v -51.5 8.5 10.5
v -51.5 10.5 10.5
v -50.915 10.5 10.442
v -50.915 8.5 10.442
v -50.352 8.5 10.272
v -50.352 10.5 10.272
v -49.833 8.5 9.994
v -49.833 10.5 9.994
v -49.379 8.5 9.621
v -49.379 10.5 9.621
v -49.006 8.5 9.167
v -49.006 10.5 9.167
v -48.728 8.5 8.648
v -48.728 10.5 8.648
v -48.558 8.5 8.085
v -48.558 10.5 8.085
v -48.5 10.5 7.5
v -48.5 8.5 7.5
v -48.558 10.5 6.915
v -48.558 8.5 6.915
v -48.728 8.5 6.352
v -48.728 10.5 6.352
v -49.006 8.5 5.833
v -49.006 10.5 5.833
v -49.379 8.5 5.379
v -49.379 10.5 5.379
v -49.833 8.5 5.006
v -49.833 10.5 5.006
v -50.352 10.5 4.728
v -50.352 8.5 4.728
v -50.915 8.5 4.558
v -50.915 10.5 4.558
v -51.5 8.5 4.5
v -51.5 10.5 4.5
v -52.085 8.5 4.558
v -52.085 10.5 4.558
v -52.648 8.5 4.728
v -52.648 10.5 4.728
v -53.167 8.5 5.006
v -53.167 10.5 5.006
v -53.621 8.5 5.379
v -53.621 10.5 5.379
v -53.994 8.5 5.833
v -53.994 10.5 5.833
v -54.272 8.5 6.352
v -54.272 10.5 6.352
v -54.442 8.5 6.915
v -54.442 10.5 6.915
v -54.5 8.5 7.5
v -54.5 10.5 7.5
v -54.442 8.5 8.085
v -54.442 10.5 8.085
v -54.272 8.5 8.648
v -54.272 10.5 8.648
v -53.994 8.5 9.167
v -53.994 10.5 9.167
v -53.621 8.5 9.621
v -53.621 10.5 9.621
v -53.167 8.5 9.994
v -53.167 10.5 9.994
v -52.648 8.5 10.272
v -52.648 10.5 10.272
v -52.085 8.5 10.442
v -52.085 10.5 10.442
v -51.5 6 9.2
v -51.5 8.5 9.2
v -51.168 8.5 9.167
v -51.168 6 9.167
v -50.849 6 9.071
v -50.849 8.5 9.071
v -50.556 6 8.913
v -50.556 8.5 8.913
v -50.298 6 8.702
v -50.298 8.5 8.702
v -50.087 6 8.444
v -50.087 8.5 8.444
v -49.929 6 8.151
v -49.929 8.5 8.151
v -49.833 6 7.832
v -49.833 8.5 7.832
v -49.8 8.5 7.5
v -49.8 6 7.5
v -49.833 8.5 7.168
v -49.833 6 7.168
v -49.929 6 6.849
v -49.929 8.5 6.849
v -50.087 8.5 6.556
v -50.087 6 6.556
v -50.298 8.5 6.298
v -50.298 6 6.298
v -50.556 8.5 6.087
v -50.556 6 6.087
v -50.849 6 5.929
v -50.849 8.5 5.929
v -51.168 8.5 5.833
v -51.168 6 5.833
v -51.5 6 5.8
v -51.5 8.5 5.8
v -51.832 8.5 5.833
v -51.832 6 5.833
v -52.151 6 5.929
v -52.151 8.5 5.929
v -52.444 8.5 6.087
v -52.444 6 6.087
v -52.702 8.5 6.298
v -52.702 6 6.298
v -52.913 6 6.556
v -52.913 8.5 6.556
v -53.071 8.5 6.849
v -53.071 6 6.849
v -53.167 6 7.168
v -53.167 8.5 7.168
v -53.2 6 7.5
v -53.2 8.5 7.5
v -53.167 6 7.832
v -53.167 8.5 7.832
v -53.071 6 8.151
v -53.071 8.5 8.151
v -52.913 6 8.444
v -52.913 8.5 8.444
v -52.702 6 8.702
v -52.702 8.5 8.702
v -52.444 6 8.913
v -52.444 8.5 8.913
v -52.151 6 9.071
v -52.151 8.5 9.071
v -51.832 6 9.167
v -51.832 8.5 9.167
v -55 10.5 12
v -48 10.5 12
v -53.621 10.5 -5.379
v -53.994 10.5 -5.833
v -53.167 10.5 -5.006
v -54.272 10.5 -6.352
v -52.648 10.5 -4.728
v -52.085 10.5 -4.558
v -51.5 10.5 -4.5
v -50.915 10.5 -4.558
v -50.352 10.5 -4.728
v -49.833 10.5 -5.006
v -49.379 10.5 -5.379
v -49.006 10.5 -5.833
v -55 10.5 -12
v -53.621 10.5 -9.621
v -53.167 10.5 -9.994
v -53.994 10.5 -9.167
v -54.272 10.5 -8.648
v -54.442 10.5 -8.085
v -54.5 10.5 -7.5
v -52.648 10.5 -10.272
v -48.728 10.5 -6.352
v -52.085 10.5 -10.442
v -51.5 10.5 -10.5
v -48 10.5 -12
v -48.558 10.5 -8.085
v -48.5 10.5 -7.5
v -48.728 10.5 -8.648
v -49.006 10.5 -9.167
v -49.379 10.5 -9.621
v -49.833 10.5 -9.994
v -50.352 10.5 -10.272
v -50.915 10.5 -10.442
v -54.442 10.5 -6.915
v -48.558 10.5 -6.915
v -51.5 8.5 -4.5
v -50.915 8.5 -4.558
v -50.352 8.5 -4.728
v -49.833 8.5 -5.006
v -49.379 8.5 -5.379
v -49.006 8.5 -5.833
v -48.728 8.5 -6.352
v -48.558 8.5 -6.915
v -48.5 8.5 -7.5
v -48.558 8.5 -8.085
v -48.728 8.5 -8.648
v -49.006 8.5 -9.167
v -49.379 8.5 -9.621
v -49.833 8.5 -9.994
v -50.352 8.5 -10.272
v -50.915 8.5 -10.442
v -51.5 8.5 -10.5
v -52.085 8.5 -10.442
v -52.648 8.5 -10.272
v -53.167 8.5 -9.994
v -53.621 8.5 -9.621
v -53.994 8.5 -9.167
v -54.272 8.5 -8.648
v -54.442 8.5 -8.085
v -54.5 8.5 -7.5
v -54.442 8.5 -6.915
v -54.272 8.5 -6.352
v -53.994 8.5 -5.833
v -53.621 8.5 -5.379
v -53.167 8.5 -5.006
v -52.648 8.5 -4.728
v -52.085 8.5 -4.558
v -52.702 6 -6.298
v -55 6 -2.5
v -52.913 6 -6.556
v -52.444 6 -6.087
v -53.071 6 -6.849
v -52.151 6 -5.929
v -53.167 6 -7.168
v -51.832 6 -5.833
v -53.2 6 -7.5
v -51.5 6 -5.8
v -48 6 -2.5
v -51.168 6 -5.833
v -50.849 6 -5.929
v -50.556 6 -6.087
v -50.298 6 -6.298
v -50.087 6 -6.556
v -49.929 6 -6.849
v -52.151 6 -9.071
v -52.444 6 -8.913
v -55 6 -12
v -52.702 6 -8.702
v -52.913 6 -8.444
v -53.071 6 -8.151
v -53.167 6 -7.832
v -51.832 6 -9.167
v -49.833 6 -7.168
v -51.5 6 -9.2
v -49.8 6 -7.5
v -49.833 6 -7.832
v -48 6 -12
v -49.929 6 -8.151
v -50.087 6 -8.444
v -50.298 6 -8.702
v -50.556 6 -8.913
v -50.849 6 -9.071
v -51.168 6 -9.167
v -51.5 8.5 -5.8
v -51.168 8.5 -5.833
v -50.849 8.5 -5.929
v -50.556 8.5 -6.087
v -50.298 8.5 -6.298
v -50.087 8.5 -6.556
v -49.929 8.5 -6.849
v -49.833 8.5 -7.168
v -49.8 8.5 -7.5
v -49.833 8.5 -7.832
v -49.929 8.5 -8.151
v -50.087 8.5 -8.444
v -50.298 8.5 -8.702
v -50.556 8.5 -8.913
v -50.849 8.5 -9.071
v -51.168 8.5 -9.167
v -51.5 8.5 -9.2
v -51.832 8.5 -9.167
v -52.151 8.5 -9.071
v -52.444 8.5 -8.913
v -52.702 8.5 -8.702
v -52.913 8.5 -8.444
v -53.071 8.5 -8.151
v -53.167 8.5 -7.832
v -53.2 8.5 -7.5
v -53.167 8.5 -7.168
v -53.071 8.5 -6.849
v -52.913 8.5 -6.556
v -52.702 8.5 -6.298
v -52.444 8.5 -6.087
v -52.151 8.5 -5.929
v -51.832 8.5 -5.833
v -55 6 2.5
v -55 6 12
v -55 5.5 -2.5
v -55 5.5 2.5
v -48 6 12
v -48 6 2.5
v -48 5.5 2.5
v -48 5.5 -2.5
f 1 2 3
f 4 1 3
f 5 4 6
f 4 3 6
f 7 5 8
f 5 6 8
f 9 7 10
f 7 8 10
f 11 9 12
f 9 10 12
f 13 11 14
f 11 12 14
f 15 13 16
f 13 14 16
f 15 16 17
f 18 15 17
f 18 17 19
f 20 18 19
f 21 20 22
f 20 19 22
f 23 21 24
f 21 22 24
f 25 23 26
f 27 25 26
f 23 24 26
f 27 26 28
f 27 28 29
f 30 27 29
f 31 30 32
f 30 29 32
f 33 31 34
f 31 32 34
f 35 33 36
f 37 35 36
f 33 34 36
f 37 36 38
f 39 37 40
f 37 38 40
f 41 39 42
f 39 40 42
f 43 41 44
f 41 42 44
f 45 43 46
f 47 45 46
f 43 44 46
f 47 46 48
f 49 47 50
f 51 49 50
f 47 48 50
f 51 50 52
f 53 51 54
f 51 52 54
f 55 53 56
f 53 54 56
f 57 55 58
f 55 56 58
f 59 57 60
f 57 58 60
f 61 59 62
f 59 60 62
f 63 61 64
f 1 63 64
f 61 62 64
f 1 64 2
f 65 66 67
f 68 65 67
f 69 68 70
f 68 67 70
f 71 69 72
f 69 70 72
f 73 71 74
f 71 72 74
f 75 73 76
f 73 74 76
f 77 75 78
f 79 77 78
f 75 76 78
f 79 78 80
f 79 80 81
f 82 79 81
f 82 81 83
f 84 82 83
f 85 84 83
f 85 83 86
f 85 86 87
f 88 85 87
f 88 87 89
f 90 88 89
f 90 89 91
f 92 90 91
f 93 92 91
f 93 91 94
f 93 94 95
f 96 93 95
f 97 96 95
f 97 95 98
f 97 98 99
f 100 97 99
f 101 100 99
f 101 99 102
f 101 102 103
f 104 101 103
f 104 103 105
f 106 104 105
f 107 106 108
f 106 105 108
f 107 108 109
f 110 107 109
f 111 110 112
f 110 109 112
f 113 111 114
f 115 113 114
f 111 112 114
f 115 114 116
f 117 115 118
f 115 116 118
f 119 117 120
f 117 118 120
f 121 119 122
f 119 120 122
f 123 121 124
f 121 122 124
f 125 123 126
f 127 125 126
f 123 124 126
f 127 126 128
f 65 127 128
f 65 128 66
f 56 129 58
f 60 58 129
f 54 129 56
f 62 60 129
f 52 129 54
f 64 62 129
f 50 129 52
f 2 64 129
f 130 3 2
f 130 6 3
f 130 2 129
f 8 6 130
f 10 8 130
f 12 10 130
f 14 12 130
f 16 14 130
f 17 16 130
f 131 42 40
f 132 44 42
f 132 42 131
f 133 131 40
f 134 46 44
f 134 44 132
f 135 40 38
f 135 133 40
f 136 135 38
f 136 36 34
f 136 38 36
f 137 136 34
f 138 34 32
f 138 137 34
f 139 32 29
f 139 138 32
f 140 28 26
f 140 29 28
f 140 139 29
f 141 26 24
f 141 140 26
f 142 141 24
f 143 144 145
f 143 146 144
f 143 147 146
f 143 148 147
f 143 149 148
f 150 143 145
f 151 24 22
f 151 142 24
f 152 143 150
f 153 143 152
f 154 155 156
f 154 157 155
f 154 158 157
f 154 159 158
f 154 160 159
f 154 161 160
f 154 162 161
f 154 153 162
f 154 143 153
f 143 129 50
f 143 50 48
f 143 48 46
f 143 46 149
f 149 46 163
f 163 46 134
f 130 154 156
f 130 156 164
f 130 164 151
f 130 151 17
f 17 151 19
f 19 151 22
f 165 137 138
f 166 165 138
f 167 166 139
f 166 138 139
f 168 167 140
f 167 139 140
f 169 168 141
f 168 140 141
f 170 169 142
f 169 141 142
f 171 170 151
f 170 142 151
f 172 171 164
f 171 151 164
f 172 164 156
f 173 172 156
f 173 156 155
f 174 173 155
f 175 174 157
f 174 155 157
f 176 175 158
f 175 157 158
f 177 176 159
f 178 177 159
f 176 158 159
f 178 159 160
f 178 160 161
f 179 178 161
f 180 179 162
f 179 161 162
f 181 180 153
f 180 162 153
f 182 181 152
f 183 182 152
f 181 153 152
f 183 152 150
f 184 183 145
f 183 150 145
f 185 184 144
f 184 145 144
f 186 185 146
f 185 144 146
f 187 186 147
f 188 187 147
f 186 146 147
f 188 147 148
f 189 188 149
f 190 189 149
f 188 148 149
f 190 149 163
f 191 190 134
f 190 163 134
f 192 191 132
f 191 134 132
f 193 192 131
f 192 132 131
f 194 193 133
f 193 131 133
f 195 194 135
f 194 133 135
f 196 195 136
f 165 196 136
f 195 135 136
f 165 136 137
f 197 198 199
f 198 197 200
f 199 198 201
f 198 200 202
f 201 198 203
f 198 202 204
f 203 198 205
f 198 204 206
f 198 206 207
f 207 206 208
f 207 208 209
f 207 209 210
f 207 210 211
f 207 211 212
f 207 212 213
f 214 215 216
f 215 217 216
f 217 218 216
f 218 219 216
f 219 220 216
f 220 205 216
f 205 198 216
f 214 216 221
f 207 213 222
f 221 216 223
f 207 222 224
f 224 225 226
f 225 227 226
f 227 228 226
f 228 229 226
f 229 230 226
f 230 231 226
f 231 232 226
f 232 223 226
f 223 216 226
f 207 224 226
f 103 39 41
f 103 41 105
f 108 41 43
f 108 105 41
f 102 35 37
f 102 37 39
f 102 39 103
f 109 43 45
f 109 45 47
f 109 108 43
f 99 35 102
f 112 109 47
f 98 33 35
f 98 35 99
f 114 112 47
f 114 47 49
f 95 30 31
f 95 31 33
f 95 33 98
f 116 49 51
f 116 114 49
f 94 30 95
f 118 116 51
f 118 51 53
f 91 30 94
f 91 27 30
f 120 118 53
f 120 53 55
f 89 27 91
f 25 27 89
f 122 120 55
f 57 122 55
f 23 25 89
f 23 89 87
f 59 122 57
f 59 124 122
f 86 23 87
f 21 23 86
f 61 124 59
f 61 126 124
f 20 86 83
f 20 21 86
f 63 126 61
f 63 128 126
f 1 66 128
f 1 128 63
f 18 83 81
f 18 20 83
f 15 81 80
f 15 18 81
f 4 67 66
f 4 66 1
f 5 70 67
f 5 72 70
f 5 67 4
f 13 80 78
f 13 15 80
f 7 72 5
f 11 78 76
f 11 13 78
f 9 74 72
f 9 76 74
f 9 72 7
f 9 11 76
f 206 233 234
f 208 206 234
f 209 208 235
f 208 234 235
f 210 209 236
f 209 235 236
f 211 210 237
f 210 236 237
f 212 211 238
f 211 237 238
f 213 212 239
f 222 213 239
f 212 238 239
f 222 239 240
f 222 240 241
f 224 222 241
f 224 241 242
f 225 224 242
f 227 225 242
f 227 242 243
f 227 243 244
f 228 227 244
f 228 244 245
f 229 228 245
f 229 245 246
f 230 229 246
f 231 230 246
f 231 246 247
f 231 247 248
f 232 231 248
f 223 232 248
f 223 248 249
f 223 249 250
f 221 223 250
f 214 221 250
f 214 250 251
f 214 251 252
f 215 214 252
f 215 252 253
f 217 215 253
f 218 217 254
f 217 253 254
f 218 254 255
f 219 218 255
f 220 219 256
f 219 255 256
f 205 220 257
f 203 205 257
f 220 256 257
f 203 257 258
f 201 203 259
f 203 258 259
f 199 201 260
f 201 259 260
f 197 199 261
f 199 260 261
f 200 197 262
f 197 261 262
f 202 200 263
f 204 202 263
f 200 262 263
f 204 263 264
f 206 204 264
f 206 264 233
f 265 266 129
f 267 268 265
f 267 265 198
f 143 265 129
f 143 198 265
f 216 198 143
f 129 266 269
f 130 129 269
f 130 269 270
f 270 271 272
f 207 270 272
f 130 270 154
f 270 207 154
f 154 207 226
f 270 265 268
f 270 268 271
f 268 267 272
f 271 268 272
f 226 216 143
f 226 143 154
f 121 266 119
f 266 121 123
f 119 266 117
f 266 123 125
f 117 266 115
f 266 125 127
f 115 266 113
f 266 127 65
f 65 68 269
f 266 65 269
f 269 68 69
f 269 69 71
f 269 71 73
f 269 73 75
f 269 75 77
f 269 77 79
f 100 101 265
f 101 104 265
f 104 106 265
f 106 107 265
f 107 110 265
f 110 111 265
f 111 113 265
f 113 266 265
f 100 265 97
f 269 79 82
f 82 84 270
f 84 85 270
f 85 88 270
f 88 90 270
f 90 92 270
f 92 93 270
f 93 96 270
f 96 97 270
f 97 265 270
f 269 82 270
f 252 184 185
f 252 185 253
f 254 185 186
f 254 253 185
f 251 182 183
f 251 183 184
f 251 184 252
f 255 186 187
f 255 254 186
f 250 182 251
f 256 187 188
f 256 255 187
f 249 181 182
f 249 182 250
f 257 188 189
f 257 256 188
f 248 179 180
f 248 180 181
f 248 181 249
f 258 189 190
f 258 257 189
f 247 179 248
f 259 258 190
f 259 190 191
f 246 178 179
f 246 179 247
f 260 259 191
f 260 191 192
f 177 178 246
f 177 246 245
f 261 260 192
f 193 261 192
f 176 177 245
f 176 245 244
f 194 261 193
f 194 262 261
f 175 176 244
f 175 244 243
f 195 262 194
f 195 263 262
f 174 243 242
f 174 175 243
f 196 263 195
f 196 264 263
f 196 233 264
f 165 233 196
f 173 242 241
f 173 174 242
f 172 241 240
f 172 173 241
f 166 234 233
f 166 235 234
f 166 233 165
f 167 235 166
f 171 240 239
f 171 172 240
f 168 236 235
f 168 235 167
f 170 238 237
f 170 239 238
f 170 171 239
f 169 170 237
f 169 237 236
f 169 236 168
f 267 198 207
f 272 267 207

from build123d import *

# Parameters (mm, degrees)
SKETCH1_W           = 7
SKETCH1_H           = 24
BOSS_EXTRUDE1_DEPTH = 4.5
SKETCH2_W           = 7
SKETCH2_H           = 5
BOSS_EXTRUDE2_DEPTH = 0.5
SKETCH3_R           = 1.7
CUT_EXTRUDE1_DEPTH  = 57.515484604
SKETCH4_R           = 3
CUT_EXTRUDE2_DEPTH  = 2


with BuildPart() as part:
    # Sketch1 → Boss-Extrude1 (new body)
    with BuildSketch(Plane(origin=(0, 6, 0), x_dir=(1, 0, 0), z_dir=(0, 1, 0))):
        with Locations((-51.5, 0)):
            Rectangle(SKETCH1_W, SKETCH1_H)
    extrude(amount=BOSS_EXTRUDE1_DEPTH)

    # Sketch2 → Boss-Extrude2 (add)
    with BuildSketch(Plane(origin=(0, 6, 0), x_dir=(1, 0, 0), z_dir=(0, 1, 0))):
        with Locations((-51.5, 0)):
            Rectangle(SKETCH2_W, SKETCH2_H)
    extrude(amount=-BOSS_EXTRUDE2_DEPTH)

    # Sketch3 → Cut-Extrude1 (cut, through all)
    with BuildSketch(Plane(origin=(0, 10.5, 0), x_dir=(1, 0, 0), z_dir=(0, 1, 0))):
        with Locations(Location((-51.5, 7.5, 0), (0, 0, 270))):
            Circle(SKETCH3_R)
        with Locations(Location((-51.5, -7.5, 0), (0, 0, 270))):
            Circle(SKETCH3_R)
    extrude(amount=-CUT_EXTRUDE1_DEPTH, mode=Mode.SUBTRACT)

    # Sketch4 → Cut-Extrude2 (cut)
    with BuildSketch(Plane(origin=(0, 10.5, 0), x_dir=(1, 0, 0), z_dir=(0, 1, 0))):
        with Locations(Location((-51.5, 7.5, 0), (0, 0, 270))):
            Circle(SKETCH4_R)
        with Locations(Location((-51.5, -7.5, 0), (0, 0, 270))):
            Circle(SKETCH4_R)
    extrude(amount=-CUT_EXTRUDE2_DEPTH, mode=Mode.SUBTRACT)


solid = part.part
